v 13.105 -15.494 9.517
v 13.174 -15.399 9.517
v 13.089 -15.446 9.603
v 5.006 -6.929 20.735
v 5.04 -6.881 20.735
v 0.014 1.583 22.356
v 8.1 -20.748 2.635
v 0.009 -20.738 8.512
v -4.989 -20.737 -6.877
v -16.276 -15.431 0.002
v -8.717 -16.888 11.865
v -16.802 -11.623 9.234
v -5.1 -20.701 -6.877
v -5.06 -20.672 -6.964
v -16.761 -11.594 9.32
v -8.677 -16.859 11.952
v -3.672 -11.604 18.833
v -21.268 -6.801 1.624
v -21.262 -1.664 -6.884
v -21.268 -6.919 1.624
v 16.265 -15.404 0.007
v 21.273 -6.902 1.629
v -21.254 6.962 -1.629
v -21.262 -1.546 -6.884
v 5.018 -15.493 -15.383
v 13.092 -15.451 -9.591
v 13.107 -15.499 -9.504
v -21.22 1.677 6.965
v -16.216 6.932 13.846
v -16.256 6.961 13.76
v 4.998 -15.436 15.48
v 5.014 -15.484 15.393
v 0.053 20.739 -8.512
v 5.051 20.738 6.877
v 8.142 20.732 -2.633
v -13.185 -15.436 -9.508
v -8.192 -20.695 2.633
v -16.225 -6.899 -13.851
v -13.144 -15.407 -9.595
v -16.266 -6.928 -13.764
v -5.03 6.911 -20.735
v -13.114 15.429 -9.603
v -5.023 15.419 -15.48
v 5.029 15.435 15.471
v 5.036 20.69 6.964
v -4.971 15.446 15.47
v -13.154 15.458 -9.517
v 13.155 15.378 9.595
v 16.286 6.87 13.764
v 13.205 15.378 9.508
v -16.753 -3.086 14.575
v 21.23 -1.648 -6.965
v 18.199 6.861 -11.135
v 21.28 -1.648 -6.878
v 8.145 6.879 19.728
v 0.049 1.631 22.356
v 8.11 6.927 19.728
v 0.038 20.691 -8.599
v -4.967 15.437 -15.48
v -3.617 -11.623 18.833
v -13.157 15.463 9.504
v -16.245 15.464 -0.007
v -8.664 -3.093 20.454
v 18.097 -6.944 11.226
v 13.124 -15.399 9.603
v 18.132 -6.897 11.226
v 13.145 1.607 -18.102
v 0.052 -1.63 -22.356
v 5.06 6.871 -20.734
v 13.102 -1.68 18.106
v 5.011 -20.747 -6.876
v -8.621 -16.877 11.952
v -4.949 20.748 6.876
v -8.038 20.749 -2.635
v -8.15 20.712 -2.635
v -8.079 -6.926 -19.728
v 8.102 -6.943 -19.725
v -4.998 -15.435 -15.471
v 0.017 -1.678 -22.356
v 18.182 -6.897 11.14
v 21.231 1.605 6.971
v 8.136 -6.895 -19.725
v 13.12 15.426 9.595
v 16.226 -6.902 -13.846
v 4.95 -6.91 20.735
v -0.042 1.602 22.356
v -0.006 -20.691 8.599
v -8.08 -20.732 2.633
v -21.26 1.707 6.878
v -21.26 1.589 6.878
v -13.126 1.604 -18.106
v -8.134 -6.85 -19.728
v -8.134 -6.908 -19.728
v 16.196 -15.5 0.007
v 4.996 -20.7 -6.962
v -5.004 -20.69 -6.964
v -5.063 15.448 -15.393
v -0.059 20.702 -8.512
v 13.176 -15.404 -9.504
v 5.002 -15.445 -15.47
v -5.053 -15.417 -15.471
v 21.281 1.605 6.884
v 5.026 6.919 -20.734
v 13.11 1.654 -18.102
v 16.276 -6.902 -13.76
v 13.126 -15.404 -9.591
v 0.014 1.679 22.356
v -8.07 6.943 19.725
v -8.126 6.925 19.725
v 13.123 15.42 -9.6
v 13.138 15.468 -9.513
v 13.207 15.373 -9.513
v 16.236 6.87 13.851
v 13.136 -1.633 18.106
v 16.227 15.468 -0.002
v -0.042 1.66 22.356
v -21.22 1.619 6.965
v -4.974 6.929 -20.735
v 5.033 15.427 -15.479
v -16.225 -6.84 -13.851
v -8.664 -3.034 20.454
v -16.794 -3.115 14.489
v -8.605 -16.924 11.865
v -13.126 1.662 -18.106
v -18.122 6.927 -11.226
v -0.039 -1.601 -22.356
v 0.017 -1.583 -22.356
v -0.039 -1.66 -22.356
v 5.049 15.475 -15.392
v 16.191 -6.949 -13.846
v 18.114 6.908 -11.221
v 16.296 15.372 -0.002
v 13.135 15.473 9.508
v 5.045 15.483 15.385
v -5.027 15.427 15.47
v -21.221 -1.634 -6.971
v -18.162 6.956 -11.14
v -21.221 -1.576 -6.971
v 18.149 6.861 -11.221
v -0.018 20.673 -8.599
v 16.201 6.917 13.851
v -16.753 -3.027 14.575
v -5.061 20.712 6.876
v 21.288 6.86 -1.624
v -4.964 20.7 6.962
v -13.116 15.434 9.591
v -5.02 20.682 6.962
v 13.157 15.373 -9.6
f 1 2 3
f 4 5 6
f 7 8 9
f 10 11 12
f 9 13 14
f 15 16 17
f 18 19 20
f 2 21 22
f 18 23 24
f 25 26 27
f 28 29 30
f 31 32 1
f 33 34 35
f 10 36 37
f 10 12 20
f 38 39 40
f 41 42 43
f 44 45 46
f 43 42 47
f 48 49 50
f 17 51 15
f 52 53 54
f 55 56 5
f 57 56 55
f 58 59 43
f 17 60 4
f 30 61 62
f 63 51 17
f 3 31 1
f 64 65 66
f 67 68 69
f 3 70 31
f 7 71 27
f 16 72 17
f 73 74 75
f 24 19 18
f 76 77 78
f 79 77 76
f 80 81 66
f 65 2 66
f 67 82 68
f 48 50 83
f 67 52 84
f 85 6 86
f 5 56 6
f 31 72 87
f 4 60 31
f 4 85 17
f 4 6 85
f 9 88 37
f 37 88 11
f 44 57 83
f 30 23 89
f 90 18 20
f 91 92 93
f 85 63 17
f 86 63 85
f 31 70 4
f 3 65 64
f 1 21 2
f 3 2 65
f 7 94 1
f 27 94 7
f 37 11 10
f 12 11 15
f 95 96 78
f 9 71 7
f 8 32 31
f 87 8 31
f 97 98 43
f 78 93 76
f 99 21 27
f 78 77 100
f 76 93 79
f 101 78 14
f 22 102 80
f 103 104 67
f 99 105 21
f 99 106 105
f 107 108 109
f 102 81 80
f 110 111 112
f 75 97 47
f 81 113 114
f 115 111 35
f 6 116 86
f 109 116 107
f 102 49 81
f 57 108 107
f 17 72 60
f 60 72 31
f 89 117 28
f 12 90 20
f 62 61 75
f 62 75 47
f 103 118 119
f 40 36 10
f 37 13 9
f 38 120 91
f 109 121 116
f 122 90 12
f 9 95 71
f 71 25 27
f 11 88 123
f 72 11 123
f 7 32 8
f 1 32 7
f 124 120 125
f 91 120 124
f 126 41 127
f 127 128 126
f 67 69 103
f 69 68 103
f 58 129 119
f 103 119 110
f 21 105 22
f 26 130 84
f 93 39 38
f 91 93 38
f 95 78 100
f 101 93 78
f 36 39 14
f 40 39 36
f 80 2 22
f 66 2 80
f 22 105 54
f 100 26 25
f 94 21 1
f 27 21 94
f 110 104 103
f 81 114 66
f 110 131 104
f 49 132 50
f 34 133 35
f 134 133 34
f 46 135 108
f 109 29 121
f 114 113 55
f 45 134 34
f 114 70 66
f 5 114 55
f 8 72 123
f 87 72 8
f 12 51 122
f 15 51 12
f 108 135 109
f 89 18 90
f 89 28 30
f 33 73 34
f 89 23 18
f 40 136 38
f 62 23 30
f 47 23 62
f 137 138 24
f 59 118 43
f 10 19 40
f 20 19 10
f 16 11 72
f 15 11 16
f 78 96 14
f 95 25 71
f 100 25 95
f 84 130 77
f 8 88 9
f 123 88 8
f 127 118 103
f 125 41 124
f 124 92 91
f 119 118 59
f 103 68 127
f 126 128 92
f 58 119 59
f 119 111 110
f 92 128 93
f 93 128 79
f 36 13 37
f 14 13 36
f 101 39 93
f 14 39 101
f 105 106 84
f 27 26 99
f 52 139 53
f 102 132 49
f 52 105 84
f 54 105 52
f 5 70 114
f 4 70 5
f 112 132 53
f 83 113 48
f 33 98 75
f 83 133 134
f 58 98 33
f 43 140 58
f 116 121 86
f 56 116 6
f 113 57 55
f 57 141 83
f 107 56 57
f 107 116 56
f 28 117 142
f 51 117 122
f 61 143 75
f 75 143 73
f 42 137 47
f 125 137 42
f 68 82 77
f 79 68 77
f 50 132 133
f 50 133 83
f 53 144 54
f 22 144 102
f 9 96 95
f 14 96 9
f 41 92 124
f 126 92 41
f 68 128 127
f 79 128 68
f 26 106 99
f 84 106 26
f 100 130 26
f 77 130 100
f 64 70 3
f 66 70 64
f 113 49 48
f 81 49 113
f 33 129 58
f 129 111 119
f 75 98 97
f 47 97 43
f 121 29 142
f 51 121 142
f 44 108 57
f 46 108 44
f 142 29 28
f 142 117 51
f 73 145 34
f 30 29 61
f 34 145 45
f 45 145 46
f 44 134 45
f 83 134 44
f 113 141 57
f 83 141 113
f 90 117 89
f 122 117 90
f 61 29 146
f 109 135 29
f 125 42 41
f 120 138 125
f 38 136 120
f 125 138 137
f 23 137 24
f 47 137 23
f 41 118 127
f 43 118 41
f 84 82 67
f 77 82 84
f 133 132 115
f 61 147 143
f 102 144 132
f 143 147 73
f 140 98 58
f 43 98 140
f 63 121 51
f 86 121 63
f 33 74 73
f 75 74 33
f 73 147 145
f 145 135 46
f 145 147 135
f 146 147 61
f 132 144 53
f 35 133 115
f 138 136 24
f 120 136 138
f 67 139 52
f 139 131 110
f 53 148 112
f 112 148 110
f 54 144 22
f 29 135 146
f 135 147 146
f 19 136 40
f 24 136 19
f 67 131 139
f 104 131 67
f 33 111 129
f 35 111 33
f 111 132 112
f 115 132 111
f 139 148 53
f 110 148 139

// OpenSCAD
// Auto-generated OpenSCAD file

    inner_points = 10*[[0.4982653980766405, -1.5388919231610623, 1.5393363903873012], [-0.8068736646819853, 2.0653401802806552, -0.26354876440786346], [1.3073648240481315, -1.5398674426273666, 0.9516654218561215], [0.002225761289505589, 2.064364660814351, -0.8512197329390432], [-0.0021659764585628583, -2.064309761764819, 0.8512197329390432], [-1.3073050392171888, 1.5399223416768983, -0.9516654218561215], [0.806933449512928, -2.065285281231123, 0.26354876440786346], [-0.4982056132456978, 1.538946822210594, -1.5393363903873012], [0.8094616091828152, 0.6879461581665325, 1.9640916790444136], [0.5013600702814154, 1.5387899412658312, 1.538488226887524], [1.618561035154306, 0.6869706387002283, 1.376420710513234], [1.3104594962529064, 1.537814421799527, 0.9508172583563443], [-1.3103997114219637, -1.5377595227499954, -0.9508172583563443], [-1.6185012503233633, -0.6869157396506964, -1.376420710513234], [-0.5013002854504727, -1.5387350422162995, -1.538488226887524], [-0.8094018243518725, -0.6878912591170006, -1.9640916790444136], [-0.3632023257258499, -1.1575104845764261, 1.874629633906567], [-1.6175052742532738, 0.6902244437626138, 1.3759636881962922], [2.11799643361942, -0.16475170610932488, -0.6878470307480342], [1.80989489471802, 0.686092076989974, -1.113450482904924], [-0.8636337002610531, -1.682928323180183, 1.1865129764583089], [-2.1179366487884774, 0.1648066051588568, 0.6878470307480342], [1.6175650590842165, -0.6901695447130819, -1.3759636881962922], [1.3094635201828169, 0.1606742383862172, -1.801567140353182], [-1.6713033491584084, -0.3056612204164664, 1.4488849540869335], [-1.6164559261859313, 1.5404952842694055, -0.0006525929083594884], [1.616515711016874, -1.5404403852198738, 0.0006525929083594884], [0.5017938712854613, 1.5379413411499334, -1.5391951627245575], [1.308628903883075, -0.1632517229285385, 1.8019368791743966], [0.502008603053062, 2.0642862203419696, 0.6876925756983694], [-0.5019488182221193, -2.0642313212924375, -0.6876925756983694], [-1.3085691190521322, 0.16330662197807044, -1.8019368791743966], [-0.8085715455209747, 0.6895730606977254, 1.9638631678859428], [2.1187776779219085, 0.6860435981119489, -0.16235037046143486], [-2.118717893090966, -0.685988699062417, 0.16235037046143486], [0.8086313303519174, -0.6895181616481935, -1.9638631678859428], [0.4990466423791289, -0.6880966189397884, 2.0648330506739008], [-0.4979908814780968, 2.0652917014026304, 0.6875513480356257], [1.8081970138790306, -0.6896750425929558, 1.1139614493888823], [0.8111594900218052, 2.0637132777494633, -0.2633202532493928], [-0.8110997051908625, -2.063658378699931, 0.2633202532493928], [-1.808137229048088, 0.6897299416424877, -1.1139614493888823], [0.4980506663090395, -2.0652368023530983, -0.6875513480356257], [-0.49898685754818617, 0.6881515179893203, -2.0648330506739008], [-0.0001206523211306388, 0.16310126215528287, 2.2269878505439173], [-0.49863941424974345, 1.539795422326492, 1.5383469992247802], [2.1181291451502617, 0.160547319035811, 0.6884452807277197], [1.6196103832216489, 1.53724147920702, -0.00019557059141761535], [-1.6195505983907061, -1.5371865801574882, 0.00019557059141761535], [-2.118069360319319, -0.16049241998627906, -0.6884452807277197], [0.49869919908068616, -1.5397405232769603, -1.5383469992247802], [0.00018043715207336934, -0.16304636310575094, -2.2269878505439173], [-0.8623696204261098, -0.3063126034813549, 2.0367844337765844], [-1.3075731429820427, 1.5404468053913802, 0.9504475195351298], [2.1173479008477734, -0.6902479851854629, 0.16294862044112013], [1.3107276000177606, 1.5372899580850452, -0.9512956830349069], [-1.6720845934608974, -1.1564565246377405, 0.9233882938003342], [-2.1172881160168306, 0.6903028842349949, -0.16294862044112013], [1.3076329278129855, -1.5403919063418485, -0.9504475195351298], [0.5010126269829727, 0.6871460369286596, -2.064691823011157]];

    outer_points = 10*[[-1.6164263474160376, 1.540530198196601, 0.0007411635307135733], [1.8084479879401716, -0.6904570556640348, 1.1130376932964519], [-2.1173362224037997, 0.6904570556640348, -0.16193935000594717], [1.3075381129524095, -1.540530198196601, 0.9503571797597912], [-1.3075381129524095, 1.540530198196601, -0.9503571797597912], [2.1173362224037997, -0.6904570556640348, 0.16193935000594717], [-1.8084479879401716, 0.6904570556640348, -1.1130376932964519], [1.6164263474160376, -1.540530198196601, -0.0007411635307135733], [-0.8080324205942682, 0.6883688956896281, 1.9645100784204188], [0.0004707369442085163, 0.161704246842938, 2.227087670582251], [-1.3089422955820305, -0.161704246842938, 1.801829564883758], [-0.5004391380435538, -0.6883688956896281, 2.0644071570455904], [0.5004391380435538, 0.6883688956896281, -2.0644071570455904], [1.3089422955820305, 0.161704246842938, -1.801829564883758], [-0.0004707369442085163, -0.161704246842938, -2.227087670582251], [0.8080324205942682, -0.6883688956896281, -1.9645100784204188], [-0.8068253309307626, 2.065327139983024, 0.26367530737214767], [1.310751602061966, 1.5371514843840641, 0.9514008247041035], [-1.6196398365255942, -1.5371514843840641, -0.00030248141359884295], [-0.8111366789871174, -2.063816133230754, 0.2622751107482336], [-0.49793709646713447, 2.065327139983024, -0.6874230359183571], [1.6196398365255942, 1.5371514843840641, 0.00030248141359884295], [-1.310751602061966, -1.5371514843840641, -0.9514008247041035], [-0.5022484445234893, -2.063816133230754, -0.6888232325422711], [0.8112077610400529, 2.0636377830767554, 0.26345596631359025], [2.1182954910021214, 0.16001488993666946, 0.6879588834359417], [-2.1182954910021214, -0.16001488993666946, -0.6879588834359417], [0.8068964129836984, -2.0655054901370224, 0.26205576968967625], [-1.6171284387308482, 0.6894129756768315, 1.376834535852488], [0.49956030771649484, -0.6894129756768315, 2.0642715968162735], [-0.49956030771649484, 0.6894129756768315, -2.0642715968162735], [1.6171284387308482, -0.6894129756768315, -1.376834535852488], [0.5018145282277302, 1.5377967613031291, 1.5392957083305916], [-1.3104944247784551, -1.5377967613031291, 0.9507120810476654], [1.3104944247784551, 1.5377967613031291, -0.9507120810476654], [-0.5018145282277302, -1.5377967613031291, -1.5392957083305916], [-1.3072809356688984, 1.5398849212775358, 0.9517557259919778], [1.309090242148834, -0.16443768373640988, 1.8014746635958836], [-2.117770138699559, 0.16443768373640988, 0.6885331257823732], [0.4986010391181734, -1.5398849212775358, 1.538252063386279], [-0.4986010391181734, 1.5398849212775358, -1.538252063386279], [2.117770138699559, -0.16443768373640988, -0.6885331257823732], [-1.309090242148834, 0.16443768373640988, -1.8014746635958836], [1.3072809356688984, -1.5398849212775358, -0.9517557259919778], [-0.49818491753231864, 1.5388408412903325, 1.5394312685599083], [0.8100006713765475, 0.6866795387833595, 1.9642907373618614], [-1.8095839955507416, -0.6866795387833595, 1.1135281548136429], [-0.5013984066418753, -1.5388408412903325, 1.538387623615596], [0.5013984066418753, 1.5388408412903325, -1.538387623615596], [1.8095839955507416, 0.6866795387833595, -1.1135281548136429], [-0.8100006713765475, -0.6866795387833595, -1.9642907373618614], [0.49818491753231864, -1.5388408412903325, -1.5394312685599083], [0.0022706872058170513, 2.064283059995821, 0.8513508499400781], [1.6189377452107836, 0.6860342618642945, 1.3763958537353733], [-2.1187294072978804, -0.6860342618642945, 0.16251359235237883], [-0.0020406608505375845, -2.0648602132179574, 0.8499506533161642], [0.502062349292914, 2.064283059995821, -0.687558596147674], [2.1187294072978804, 0.6860342618642945, -0.16251359235237883], [-1.6189377452107836, -0.6860342618642945, -1.3763958537353733], [0.49775100123655935, -2.0648602132179574, -0.688958792771588]];

    // Convex hull for inner set (I)
    module inner_hull() {
        hull() {
            for (p = inner_points) {
                translate(p) sphere(r=0.1);
            }
        }
    }

    // Convex hull for outer set (O) minus inner hull (O \ I)
    module outer_minus_inner() {
        difference() {
            hull() {
                for (p = outer_points) {
                    translate(p) sphere(r=0.1);
                }
            }
            inner_hull(); // Subtract inner hull
        }
    }

    // Convex hull for outer set (O) minus all translated inner hulls
    module outer_minus_AllTranslationInner() {
        difference() {
            hull() {
                for (p = outer_points) {
                    translate(p) sphere(r=0.1);
                }
            }
            hull() {
                translate([0,0,50]) inner_hull();
                translate([0,0,-50]) inner_hull();
            }; // Subtract translated inner hulls
        }
    }

    // Difference between outer_minus_inner and outer_minus_AllTranslationInner
    module outer_minus_inner_diff() {
        difference() {
            // Outer minus inner
            difference() {
                hull() {
                    for (p = outer_points) {
                        translate(p) sphere(r=0.1);
                    }
                }
                inner_hull();
            }

            // Subtract Outer minus AllTranslationInner
            difference() {
                hull() {
                    for (p = outer_points) {
                        translate(p) sphere(r=0.1);
                    }
                }
                hull() {
                    translate([0,0,50]) inner_hull();
                    translate([0,0,-50]) inner_hull();
                };
            }
        }
    }

    // Rendering all with colors applied
    color([1, 0, 0, 0.5]) inner_hull(); // Transparent red
    
